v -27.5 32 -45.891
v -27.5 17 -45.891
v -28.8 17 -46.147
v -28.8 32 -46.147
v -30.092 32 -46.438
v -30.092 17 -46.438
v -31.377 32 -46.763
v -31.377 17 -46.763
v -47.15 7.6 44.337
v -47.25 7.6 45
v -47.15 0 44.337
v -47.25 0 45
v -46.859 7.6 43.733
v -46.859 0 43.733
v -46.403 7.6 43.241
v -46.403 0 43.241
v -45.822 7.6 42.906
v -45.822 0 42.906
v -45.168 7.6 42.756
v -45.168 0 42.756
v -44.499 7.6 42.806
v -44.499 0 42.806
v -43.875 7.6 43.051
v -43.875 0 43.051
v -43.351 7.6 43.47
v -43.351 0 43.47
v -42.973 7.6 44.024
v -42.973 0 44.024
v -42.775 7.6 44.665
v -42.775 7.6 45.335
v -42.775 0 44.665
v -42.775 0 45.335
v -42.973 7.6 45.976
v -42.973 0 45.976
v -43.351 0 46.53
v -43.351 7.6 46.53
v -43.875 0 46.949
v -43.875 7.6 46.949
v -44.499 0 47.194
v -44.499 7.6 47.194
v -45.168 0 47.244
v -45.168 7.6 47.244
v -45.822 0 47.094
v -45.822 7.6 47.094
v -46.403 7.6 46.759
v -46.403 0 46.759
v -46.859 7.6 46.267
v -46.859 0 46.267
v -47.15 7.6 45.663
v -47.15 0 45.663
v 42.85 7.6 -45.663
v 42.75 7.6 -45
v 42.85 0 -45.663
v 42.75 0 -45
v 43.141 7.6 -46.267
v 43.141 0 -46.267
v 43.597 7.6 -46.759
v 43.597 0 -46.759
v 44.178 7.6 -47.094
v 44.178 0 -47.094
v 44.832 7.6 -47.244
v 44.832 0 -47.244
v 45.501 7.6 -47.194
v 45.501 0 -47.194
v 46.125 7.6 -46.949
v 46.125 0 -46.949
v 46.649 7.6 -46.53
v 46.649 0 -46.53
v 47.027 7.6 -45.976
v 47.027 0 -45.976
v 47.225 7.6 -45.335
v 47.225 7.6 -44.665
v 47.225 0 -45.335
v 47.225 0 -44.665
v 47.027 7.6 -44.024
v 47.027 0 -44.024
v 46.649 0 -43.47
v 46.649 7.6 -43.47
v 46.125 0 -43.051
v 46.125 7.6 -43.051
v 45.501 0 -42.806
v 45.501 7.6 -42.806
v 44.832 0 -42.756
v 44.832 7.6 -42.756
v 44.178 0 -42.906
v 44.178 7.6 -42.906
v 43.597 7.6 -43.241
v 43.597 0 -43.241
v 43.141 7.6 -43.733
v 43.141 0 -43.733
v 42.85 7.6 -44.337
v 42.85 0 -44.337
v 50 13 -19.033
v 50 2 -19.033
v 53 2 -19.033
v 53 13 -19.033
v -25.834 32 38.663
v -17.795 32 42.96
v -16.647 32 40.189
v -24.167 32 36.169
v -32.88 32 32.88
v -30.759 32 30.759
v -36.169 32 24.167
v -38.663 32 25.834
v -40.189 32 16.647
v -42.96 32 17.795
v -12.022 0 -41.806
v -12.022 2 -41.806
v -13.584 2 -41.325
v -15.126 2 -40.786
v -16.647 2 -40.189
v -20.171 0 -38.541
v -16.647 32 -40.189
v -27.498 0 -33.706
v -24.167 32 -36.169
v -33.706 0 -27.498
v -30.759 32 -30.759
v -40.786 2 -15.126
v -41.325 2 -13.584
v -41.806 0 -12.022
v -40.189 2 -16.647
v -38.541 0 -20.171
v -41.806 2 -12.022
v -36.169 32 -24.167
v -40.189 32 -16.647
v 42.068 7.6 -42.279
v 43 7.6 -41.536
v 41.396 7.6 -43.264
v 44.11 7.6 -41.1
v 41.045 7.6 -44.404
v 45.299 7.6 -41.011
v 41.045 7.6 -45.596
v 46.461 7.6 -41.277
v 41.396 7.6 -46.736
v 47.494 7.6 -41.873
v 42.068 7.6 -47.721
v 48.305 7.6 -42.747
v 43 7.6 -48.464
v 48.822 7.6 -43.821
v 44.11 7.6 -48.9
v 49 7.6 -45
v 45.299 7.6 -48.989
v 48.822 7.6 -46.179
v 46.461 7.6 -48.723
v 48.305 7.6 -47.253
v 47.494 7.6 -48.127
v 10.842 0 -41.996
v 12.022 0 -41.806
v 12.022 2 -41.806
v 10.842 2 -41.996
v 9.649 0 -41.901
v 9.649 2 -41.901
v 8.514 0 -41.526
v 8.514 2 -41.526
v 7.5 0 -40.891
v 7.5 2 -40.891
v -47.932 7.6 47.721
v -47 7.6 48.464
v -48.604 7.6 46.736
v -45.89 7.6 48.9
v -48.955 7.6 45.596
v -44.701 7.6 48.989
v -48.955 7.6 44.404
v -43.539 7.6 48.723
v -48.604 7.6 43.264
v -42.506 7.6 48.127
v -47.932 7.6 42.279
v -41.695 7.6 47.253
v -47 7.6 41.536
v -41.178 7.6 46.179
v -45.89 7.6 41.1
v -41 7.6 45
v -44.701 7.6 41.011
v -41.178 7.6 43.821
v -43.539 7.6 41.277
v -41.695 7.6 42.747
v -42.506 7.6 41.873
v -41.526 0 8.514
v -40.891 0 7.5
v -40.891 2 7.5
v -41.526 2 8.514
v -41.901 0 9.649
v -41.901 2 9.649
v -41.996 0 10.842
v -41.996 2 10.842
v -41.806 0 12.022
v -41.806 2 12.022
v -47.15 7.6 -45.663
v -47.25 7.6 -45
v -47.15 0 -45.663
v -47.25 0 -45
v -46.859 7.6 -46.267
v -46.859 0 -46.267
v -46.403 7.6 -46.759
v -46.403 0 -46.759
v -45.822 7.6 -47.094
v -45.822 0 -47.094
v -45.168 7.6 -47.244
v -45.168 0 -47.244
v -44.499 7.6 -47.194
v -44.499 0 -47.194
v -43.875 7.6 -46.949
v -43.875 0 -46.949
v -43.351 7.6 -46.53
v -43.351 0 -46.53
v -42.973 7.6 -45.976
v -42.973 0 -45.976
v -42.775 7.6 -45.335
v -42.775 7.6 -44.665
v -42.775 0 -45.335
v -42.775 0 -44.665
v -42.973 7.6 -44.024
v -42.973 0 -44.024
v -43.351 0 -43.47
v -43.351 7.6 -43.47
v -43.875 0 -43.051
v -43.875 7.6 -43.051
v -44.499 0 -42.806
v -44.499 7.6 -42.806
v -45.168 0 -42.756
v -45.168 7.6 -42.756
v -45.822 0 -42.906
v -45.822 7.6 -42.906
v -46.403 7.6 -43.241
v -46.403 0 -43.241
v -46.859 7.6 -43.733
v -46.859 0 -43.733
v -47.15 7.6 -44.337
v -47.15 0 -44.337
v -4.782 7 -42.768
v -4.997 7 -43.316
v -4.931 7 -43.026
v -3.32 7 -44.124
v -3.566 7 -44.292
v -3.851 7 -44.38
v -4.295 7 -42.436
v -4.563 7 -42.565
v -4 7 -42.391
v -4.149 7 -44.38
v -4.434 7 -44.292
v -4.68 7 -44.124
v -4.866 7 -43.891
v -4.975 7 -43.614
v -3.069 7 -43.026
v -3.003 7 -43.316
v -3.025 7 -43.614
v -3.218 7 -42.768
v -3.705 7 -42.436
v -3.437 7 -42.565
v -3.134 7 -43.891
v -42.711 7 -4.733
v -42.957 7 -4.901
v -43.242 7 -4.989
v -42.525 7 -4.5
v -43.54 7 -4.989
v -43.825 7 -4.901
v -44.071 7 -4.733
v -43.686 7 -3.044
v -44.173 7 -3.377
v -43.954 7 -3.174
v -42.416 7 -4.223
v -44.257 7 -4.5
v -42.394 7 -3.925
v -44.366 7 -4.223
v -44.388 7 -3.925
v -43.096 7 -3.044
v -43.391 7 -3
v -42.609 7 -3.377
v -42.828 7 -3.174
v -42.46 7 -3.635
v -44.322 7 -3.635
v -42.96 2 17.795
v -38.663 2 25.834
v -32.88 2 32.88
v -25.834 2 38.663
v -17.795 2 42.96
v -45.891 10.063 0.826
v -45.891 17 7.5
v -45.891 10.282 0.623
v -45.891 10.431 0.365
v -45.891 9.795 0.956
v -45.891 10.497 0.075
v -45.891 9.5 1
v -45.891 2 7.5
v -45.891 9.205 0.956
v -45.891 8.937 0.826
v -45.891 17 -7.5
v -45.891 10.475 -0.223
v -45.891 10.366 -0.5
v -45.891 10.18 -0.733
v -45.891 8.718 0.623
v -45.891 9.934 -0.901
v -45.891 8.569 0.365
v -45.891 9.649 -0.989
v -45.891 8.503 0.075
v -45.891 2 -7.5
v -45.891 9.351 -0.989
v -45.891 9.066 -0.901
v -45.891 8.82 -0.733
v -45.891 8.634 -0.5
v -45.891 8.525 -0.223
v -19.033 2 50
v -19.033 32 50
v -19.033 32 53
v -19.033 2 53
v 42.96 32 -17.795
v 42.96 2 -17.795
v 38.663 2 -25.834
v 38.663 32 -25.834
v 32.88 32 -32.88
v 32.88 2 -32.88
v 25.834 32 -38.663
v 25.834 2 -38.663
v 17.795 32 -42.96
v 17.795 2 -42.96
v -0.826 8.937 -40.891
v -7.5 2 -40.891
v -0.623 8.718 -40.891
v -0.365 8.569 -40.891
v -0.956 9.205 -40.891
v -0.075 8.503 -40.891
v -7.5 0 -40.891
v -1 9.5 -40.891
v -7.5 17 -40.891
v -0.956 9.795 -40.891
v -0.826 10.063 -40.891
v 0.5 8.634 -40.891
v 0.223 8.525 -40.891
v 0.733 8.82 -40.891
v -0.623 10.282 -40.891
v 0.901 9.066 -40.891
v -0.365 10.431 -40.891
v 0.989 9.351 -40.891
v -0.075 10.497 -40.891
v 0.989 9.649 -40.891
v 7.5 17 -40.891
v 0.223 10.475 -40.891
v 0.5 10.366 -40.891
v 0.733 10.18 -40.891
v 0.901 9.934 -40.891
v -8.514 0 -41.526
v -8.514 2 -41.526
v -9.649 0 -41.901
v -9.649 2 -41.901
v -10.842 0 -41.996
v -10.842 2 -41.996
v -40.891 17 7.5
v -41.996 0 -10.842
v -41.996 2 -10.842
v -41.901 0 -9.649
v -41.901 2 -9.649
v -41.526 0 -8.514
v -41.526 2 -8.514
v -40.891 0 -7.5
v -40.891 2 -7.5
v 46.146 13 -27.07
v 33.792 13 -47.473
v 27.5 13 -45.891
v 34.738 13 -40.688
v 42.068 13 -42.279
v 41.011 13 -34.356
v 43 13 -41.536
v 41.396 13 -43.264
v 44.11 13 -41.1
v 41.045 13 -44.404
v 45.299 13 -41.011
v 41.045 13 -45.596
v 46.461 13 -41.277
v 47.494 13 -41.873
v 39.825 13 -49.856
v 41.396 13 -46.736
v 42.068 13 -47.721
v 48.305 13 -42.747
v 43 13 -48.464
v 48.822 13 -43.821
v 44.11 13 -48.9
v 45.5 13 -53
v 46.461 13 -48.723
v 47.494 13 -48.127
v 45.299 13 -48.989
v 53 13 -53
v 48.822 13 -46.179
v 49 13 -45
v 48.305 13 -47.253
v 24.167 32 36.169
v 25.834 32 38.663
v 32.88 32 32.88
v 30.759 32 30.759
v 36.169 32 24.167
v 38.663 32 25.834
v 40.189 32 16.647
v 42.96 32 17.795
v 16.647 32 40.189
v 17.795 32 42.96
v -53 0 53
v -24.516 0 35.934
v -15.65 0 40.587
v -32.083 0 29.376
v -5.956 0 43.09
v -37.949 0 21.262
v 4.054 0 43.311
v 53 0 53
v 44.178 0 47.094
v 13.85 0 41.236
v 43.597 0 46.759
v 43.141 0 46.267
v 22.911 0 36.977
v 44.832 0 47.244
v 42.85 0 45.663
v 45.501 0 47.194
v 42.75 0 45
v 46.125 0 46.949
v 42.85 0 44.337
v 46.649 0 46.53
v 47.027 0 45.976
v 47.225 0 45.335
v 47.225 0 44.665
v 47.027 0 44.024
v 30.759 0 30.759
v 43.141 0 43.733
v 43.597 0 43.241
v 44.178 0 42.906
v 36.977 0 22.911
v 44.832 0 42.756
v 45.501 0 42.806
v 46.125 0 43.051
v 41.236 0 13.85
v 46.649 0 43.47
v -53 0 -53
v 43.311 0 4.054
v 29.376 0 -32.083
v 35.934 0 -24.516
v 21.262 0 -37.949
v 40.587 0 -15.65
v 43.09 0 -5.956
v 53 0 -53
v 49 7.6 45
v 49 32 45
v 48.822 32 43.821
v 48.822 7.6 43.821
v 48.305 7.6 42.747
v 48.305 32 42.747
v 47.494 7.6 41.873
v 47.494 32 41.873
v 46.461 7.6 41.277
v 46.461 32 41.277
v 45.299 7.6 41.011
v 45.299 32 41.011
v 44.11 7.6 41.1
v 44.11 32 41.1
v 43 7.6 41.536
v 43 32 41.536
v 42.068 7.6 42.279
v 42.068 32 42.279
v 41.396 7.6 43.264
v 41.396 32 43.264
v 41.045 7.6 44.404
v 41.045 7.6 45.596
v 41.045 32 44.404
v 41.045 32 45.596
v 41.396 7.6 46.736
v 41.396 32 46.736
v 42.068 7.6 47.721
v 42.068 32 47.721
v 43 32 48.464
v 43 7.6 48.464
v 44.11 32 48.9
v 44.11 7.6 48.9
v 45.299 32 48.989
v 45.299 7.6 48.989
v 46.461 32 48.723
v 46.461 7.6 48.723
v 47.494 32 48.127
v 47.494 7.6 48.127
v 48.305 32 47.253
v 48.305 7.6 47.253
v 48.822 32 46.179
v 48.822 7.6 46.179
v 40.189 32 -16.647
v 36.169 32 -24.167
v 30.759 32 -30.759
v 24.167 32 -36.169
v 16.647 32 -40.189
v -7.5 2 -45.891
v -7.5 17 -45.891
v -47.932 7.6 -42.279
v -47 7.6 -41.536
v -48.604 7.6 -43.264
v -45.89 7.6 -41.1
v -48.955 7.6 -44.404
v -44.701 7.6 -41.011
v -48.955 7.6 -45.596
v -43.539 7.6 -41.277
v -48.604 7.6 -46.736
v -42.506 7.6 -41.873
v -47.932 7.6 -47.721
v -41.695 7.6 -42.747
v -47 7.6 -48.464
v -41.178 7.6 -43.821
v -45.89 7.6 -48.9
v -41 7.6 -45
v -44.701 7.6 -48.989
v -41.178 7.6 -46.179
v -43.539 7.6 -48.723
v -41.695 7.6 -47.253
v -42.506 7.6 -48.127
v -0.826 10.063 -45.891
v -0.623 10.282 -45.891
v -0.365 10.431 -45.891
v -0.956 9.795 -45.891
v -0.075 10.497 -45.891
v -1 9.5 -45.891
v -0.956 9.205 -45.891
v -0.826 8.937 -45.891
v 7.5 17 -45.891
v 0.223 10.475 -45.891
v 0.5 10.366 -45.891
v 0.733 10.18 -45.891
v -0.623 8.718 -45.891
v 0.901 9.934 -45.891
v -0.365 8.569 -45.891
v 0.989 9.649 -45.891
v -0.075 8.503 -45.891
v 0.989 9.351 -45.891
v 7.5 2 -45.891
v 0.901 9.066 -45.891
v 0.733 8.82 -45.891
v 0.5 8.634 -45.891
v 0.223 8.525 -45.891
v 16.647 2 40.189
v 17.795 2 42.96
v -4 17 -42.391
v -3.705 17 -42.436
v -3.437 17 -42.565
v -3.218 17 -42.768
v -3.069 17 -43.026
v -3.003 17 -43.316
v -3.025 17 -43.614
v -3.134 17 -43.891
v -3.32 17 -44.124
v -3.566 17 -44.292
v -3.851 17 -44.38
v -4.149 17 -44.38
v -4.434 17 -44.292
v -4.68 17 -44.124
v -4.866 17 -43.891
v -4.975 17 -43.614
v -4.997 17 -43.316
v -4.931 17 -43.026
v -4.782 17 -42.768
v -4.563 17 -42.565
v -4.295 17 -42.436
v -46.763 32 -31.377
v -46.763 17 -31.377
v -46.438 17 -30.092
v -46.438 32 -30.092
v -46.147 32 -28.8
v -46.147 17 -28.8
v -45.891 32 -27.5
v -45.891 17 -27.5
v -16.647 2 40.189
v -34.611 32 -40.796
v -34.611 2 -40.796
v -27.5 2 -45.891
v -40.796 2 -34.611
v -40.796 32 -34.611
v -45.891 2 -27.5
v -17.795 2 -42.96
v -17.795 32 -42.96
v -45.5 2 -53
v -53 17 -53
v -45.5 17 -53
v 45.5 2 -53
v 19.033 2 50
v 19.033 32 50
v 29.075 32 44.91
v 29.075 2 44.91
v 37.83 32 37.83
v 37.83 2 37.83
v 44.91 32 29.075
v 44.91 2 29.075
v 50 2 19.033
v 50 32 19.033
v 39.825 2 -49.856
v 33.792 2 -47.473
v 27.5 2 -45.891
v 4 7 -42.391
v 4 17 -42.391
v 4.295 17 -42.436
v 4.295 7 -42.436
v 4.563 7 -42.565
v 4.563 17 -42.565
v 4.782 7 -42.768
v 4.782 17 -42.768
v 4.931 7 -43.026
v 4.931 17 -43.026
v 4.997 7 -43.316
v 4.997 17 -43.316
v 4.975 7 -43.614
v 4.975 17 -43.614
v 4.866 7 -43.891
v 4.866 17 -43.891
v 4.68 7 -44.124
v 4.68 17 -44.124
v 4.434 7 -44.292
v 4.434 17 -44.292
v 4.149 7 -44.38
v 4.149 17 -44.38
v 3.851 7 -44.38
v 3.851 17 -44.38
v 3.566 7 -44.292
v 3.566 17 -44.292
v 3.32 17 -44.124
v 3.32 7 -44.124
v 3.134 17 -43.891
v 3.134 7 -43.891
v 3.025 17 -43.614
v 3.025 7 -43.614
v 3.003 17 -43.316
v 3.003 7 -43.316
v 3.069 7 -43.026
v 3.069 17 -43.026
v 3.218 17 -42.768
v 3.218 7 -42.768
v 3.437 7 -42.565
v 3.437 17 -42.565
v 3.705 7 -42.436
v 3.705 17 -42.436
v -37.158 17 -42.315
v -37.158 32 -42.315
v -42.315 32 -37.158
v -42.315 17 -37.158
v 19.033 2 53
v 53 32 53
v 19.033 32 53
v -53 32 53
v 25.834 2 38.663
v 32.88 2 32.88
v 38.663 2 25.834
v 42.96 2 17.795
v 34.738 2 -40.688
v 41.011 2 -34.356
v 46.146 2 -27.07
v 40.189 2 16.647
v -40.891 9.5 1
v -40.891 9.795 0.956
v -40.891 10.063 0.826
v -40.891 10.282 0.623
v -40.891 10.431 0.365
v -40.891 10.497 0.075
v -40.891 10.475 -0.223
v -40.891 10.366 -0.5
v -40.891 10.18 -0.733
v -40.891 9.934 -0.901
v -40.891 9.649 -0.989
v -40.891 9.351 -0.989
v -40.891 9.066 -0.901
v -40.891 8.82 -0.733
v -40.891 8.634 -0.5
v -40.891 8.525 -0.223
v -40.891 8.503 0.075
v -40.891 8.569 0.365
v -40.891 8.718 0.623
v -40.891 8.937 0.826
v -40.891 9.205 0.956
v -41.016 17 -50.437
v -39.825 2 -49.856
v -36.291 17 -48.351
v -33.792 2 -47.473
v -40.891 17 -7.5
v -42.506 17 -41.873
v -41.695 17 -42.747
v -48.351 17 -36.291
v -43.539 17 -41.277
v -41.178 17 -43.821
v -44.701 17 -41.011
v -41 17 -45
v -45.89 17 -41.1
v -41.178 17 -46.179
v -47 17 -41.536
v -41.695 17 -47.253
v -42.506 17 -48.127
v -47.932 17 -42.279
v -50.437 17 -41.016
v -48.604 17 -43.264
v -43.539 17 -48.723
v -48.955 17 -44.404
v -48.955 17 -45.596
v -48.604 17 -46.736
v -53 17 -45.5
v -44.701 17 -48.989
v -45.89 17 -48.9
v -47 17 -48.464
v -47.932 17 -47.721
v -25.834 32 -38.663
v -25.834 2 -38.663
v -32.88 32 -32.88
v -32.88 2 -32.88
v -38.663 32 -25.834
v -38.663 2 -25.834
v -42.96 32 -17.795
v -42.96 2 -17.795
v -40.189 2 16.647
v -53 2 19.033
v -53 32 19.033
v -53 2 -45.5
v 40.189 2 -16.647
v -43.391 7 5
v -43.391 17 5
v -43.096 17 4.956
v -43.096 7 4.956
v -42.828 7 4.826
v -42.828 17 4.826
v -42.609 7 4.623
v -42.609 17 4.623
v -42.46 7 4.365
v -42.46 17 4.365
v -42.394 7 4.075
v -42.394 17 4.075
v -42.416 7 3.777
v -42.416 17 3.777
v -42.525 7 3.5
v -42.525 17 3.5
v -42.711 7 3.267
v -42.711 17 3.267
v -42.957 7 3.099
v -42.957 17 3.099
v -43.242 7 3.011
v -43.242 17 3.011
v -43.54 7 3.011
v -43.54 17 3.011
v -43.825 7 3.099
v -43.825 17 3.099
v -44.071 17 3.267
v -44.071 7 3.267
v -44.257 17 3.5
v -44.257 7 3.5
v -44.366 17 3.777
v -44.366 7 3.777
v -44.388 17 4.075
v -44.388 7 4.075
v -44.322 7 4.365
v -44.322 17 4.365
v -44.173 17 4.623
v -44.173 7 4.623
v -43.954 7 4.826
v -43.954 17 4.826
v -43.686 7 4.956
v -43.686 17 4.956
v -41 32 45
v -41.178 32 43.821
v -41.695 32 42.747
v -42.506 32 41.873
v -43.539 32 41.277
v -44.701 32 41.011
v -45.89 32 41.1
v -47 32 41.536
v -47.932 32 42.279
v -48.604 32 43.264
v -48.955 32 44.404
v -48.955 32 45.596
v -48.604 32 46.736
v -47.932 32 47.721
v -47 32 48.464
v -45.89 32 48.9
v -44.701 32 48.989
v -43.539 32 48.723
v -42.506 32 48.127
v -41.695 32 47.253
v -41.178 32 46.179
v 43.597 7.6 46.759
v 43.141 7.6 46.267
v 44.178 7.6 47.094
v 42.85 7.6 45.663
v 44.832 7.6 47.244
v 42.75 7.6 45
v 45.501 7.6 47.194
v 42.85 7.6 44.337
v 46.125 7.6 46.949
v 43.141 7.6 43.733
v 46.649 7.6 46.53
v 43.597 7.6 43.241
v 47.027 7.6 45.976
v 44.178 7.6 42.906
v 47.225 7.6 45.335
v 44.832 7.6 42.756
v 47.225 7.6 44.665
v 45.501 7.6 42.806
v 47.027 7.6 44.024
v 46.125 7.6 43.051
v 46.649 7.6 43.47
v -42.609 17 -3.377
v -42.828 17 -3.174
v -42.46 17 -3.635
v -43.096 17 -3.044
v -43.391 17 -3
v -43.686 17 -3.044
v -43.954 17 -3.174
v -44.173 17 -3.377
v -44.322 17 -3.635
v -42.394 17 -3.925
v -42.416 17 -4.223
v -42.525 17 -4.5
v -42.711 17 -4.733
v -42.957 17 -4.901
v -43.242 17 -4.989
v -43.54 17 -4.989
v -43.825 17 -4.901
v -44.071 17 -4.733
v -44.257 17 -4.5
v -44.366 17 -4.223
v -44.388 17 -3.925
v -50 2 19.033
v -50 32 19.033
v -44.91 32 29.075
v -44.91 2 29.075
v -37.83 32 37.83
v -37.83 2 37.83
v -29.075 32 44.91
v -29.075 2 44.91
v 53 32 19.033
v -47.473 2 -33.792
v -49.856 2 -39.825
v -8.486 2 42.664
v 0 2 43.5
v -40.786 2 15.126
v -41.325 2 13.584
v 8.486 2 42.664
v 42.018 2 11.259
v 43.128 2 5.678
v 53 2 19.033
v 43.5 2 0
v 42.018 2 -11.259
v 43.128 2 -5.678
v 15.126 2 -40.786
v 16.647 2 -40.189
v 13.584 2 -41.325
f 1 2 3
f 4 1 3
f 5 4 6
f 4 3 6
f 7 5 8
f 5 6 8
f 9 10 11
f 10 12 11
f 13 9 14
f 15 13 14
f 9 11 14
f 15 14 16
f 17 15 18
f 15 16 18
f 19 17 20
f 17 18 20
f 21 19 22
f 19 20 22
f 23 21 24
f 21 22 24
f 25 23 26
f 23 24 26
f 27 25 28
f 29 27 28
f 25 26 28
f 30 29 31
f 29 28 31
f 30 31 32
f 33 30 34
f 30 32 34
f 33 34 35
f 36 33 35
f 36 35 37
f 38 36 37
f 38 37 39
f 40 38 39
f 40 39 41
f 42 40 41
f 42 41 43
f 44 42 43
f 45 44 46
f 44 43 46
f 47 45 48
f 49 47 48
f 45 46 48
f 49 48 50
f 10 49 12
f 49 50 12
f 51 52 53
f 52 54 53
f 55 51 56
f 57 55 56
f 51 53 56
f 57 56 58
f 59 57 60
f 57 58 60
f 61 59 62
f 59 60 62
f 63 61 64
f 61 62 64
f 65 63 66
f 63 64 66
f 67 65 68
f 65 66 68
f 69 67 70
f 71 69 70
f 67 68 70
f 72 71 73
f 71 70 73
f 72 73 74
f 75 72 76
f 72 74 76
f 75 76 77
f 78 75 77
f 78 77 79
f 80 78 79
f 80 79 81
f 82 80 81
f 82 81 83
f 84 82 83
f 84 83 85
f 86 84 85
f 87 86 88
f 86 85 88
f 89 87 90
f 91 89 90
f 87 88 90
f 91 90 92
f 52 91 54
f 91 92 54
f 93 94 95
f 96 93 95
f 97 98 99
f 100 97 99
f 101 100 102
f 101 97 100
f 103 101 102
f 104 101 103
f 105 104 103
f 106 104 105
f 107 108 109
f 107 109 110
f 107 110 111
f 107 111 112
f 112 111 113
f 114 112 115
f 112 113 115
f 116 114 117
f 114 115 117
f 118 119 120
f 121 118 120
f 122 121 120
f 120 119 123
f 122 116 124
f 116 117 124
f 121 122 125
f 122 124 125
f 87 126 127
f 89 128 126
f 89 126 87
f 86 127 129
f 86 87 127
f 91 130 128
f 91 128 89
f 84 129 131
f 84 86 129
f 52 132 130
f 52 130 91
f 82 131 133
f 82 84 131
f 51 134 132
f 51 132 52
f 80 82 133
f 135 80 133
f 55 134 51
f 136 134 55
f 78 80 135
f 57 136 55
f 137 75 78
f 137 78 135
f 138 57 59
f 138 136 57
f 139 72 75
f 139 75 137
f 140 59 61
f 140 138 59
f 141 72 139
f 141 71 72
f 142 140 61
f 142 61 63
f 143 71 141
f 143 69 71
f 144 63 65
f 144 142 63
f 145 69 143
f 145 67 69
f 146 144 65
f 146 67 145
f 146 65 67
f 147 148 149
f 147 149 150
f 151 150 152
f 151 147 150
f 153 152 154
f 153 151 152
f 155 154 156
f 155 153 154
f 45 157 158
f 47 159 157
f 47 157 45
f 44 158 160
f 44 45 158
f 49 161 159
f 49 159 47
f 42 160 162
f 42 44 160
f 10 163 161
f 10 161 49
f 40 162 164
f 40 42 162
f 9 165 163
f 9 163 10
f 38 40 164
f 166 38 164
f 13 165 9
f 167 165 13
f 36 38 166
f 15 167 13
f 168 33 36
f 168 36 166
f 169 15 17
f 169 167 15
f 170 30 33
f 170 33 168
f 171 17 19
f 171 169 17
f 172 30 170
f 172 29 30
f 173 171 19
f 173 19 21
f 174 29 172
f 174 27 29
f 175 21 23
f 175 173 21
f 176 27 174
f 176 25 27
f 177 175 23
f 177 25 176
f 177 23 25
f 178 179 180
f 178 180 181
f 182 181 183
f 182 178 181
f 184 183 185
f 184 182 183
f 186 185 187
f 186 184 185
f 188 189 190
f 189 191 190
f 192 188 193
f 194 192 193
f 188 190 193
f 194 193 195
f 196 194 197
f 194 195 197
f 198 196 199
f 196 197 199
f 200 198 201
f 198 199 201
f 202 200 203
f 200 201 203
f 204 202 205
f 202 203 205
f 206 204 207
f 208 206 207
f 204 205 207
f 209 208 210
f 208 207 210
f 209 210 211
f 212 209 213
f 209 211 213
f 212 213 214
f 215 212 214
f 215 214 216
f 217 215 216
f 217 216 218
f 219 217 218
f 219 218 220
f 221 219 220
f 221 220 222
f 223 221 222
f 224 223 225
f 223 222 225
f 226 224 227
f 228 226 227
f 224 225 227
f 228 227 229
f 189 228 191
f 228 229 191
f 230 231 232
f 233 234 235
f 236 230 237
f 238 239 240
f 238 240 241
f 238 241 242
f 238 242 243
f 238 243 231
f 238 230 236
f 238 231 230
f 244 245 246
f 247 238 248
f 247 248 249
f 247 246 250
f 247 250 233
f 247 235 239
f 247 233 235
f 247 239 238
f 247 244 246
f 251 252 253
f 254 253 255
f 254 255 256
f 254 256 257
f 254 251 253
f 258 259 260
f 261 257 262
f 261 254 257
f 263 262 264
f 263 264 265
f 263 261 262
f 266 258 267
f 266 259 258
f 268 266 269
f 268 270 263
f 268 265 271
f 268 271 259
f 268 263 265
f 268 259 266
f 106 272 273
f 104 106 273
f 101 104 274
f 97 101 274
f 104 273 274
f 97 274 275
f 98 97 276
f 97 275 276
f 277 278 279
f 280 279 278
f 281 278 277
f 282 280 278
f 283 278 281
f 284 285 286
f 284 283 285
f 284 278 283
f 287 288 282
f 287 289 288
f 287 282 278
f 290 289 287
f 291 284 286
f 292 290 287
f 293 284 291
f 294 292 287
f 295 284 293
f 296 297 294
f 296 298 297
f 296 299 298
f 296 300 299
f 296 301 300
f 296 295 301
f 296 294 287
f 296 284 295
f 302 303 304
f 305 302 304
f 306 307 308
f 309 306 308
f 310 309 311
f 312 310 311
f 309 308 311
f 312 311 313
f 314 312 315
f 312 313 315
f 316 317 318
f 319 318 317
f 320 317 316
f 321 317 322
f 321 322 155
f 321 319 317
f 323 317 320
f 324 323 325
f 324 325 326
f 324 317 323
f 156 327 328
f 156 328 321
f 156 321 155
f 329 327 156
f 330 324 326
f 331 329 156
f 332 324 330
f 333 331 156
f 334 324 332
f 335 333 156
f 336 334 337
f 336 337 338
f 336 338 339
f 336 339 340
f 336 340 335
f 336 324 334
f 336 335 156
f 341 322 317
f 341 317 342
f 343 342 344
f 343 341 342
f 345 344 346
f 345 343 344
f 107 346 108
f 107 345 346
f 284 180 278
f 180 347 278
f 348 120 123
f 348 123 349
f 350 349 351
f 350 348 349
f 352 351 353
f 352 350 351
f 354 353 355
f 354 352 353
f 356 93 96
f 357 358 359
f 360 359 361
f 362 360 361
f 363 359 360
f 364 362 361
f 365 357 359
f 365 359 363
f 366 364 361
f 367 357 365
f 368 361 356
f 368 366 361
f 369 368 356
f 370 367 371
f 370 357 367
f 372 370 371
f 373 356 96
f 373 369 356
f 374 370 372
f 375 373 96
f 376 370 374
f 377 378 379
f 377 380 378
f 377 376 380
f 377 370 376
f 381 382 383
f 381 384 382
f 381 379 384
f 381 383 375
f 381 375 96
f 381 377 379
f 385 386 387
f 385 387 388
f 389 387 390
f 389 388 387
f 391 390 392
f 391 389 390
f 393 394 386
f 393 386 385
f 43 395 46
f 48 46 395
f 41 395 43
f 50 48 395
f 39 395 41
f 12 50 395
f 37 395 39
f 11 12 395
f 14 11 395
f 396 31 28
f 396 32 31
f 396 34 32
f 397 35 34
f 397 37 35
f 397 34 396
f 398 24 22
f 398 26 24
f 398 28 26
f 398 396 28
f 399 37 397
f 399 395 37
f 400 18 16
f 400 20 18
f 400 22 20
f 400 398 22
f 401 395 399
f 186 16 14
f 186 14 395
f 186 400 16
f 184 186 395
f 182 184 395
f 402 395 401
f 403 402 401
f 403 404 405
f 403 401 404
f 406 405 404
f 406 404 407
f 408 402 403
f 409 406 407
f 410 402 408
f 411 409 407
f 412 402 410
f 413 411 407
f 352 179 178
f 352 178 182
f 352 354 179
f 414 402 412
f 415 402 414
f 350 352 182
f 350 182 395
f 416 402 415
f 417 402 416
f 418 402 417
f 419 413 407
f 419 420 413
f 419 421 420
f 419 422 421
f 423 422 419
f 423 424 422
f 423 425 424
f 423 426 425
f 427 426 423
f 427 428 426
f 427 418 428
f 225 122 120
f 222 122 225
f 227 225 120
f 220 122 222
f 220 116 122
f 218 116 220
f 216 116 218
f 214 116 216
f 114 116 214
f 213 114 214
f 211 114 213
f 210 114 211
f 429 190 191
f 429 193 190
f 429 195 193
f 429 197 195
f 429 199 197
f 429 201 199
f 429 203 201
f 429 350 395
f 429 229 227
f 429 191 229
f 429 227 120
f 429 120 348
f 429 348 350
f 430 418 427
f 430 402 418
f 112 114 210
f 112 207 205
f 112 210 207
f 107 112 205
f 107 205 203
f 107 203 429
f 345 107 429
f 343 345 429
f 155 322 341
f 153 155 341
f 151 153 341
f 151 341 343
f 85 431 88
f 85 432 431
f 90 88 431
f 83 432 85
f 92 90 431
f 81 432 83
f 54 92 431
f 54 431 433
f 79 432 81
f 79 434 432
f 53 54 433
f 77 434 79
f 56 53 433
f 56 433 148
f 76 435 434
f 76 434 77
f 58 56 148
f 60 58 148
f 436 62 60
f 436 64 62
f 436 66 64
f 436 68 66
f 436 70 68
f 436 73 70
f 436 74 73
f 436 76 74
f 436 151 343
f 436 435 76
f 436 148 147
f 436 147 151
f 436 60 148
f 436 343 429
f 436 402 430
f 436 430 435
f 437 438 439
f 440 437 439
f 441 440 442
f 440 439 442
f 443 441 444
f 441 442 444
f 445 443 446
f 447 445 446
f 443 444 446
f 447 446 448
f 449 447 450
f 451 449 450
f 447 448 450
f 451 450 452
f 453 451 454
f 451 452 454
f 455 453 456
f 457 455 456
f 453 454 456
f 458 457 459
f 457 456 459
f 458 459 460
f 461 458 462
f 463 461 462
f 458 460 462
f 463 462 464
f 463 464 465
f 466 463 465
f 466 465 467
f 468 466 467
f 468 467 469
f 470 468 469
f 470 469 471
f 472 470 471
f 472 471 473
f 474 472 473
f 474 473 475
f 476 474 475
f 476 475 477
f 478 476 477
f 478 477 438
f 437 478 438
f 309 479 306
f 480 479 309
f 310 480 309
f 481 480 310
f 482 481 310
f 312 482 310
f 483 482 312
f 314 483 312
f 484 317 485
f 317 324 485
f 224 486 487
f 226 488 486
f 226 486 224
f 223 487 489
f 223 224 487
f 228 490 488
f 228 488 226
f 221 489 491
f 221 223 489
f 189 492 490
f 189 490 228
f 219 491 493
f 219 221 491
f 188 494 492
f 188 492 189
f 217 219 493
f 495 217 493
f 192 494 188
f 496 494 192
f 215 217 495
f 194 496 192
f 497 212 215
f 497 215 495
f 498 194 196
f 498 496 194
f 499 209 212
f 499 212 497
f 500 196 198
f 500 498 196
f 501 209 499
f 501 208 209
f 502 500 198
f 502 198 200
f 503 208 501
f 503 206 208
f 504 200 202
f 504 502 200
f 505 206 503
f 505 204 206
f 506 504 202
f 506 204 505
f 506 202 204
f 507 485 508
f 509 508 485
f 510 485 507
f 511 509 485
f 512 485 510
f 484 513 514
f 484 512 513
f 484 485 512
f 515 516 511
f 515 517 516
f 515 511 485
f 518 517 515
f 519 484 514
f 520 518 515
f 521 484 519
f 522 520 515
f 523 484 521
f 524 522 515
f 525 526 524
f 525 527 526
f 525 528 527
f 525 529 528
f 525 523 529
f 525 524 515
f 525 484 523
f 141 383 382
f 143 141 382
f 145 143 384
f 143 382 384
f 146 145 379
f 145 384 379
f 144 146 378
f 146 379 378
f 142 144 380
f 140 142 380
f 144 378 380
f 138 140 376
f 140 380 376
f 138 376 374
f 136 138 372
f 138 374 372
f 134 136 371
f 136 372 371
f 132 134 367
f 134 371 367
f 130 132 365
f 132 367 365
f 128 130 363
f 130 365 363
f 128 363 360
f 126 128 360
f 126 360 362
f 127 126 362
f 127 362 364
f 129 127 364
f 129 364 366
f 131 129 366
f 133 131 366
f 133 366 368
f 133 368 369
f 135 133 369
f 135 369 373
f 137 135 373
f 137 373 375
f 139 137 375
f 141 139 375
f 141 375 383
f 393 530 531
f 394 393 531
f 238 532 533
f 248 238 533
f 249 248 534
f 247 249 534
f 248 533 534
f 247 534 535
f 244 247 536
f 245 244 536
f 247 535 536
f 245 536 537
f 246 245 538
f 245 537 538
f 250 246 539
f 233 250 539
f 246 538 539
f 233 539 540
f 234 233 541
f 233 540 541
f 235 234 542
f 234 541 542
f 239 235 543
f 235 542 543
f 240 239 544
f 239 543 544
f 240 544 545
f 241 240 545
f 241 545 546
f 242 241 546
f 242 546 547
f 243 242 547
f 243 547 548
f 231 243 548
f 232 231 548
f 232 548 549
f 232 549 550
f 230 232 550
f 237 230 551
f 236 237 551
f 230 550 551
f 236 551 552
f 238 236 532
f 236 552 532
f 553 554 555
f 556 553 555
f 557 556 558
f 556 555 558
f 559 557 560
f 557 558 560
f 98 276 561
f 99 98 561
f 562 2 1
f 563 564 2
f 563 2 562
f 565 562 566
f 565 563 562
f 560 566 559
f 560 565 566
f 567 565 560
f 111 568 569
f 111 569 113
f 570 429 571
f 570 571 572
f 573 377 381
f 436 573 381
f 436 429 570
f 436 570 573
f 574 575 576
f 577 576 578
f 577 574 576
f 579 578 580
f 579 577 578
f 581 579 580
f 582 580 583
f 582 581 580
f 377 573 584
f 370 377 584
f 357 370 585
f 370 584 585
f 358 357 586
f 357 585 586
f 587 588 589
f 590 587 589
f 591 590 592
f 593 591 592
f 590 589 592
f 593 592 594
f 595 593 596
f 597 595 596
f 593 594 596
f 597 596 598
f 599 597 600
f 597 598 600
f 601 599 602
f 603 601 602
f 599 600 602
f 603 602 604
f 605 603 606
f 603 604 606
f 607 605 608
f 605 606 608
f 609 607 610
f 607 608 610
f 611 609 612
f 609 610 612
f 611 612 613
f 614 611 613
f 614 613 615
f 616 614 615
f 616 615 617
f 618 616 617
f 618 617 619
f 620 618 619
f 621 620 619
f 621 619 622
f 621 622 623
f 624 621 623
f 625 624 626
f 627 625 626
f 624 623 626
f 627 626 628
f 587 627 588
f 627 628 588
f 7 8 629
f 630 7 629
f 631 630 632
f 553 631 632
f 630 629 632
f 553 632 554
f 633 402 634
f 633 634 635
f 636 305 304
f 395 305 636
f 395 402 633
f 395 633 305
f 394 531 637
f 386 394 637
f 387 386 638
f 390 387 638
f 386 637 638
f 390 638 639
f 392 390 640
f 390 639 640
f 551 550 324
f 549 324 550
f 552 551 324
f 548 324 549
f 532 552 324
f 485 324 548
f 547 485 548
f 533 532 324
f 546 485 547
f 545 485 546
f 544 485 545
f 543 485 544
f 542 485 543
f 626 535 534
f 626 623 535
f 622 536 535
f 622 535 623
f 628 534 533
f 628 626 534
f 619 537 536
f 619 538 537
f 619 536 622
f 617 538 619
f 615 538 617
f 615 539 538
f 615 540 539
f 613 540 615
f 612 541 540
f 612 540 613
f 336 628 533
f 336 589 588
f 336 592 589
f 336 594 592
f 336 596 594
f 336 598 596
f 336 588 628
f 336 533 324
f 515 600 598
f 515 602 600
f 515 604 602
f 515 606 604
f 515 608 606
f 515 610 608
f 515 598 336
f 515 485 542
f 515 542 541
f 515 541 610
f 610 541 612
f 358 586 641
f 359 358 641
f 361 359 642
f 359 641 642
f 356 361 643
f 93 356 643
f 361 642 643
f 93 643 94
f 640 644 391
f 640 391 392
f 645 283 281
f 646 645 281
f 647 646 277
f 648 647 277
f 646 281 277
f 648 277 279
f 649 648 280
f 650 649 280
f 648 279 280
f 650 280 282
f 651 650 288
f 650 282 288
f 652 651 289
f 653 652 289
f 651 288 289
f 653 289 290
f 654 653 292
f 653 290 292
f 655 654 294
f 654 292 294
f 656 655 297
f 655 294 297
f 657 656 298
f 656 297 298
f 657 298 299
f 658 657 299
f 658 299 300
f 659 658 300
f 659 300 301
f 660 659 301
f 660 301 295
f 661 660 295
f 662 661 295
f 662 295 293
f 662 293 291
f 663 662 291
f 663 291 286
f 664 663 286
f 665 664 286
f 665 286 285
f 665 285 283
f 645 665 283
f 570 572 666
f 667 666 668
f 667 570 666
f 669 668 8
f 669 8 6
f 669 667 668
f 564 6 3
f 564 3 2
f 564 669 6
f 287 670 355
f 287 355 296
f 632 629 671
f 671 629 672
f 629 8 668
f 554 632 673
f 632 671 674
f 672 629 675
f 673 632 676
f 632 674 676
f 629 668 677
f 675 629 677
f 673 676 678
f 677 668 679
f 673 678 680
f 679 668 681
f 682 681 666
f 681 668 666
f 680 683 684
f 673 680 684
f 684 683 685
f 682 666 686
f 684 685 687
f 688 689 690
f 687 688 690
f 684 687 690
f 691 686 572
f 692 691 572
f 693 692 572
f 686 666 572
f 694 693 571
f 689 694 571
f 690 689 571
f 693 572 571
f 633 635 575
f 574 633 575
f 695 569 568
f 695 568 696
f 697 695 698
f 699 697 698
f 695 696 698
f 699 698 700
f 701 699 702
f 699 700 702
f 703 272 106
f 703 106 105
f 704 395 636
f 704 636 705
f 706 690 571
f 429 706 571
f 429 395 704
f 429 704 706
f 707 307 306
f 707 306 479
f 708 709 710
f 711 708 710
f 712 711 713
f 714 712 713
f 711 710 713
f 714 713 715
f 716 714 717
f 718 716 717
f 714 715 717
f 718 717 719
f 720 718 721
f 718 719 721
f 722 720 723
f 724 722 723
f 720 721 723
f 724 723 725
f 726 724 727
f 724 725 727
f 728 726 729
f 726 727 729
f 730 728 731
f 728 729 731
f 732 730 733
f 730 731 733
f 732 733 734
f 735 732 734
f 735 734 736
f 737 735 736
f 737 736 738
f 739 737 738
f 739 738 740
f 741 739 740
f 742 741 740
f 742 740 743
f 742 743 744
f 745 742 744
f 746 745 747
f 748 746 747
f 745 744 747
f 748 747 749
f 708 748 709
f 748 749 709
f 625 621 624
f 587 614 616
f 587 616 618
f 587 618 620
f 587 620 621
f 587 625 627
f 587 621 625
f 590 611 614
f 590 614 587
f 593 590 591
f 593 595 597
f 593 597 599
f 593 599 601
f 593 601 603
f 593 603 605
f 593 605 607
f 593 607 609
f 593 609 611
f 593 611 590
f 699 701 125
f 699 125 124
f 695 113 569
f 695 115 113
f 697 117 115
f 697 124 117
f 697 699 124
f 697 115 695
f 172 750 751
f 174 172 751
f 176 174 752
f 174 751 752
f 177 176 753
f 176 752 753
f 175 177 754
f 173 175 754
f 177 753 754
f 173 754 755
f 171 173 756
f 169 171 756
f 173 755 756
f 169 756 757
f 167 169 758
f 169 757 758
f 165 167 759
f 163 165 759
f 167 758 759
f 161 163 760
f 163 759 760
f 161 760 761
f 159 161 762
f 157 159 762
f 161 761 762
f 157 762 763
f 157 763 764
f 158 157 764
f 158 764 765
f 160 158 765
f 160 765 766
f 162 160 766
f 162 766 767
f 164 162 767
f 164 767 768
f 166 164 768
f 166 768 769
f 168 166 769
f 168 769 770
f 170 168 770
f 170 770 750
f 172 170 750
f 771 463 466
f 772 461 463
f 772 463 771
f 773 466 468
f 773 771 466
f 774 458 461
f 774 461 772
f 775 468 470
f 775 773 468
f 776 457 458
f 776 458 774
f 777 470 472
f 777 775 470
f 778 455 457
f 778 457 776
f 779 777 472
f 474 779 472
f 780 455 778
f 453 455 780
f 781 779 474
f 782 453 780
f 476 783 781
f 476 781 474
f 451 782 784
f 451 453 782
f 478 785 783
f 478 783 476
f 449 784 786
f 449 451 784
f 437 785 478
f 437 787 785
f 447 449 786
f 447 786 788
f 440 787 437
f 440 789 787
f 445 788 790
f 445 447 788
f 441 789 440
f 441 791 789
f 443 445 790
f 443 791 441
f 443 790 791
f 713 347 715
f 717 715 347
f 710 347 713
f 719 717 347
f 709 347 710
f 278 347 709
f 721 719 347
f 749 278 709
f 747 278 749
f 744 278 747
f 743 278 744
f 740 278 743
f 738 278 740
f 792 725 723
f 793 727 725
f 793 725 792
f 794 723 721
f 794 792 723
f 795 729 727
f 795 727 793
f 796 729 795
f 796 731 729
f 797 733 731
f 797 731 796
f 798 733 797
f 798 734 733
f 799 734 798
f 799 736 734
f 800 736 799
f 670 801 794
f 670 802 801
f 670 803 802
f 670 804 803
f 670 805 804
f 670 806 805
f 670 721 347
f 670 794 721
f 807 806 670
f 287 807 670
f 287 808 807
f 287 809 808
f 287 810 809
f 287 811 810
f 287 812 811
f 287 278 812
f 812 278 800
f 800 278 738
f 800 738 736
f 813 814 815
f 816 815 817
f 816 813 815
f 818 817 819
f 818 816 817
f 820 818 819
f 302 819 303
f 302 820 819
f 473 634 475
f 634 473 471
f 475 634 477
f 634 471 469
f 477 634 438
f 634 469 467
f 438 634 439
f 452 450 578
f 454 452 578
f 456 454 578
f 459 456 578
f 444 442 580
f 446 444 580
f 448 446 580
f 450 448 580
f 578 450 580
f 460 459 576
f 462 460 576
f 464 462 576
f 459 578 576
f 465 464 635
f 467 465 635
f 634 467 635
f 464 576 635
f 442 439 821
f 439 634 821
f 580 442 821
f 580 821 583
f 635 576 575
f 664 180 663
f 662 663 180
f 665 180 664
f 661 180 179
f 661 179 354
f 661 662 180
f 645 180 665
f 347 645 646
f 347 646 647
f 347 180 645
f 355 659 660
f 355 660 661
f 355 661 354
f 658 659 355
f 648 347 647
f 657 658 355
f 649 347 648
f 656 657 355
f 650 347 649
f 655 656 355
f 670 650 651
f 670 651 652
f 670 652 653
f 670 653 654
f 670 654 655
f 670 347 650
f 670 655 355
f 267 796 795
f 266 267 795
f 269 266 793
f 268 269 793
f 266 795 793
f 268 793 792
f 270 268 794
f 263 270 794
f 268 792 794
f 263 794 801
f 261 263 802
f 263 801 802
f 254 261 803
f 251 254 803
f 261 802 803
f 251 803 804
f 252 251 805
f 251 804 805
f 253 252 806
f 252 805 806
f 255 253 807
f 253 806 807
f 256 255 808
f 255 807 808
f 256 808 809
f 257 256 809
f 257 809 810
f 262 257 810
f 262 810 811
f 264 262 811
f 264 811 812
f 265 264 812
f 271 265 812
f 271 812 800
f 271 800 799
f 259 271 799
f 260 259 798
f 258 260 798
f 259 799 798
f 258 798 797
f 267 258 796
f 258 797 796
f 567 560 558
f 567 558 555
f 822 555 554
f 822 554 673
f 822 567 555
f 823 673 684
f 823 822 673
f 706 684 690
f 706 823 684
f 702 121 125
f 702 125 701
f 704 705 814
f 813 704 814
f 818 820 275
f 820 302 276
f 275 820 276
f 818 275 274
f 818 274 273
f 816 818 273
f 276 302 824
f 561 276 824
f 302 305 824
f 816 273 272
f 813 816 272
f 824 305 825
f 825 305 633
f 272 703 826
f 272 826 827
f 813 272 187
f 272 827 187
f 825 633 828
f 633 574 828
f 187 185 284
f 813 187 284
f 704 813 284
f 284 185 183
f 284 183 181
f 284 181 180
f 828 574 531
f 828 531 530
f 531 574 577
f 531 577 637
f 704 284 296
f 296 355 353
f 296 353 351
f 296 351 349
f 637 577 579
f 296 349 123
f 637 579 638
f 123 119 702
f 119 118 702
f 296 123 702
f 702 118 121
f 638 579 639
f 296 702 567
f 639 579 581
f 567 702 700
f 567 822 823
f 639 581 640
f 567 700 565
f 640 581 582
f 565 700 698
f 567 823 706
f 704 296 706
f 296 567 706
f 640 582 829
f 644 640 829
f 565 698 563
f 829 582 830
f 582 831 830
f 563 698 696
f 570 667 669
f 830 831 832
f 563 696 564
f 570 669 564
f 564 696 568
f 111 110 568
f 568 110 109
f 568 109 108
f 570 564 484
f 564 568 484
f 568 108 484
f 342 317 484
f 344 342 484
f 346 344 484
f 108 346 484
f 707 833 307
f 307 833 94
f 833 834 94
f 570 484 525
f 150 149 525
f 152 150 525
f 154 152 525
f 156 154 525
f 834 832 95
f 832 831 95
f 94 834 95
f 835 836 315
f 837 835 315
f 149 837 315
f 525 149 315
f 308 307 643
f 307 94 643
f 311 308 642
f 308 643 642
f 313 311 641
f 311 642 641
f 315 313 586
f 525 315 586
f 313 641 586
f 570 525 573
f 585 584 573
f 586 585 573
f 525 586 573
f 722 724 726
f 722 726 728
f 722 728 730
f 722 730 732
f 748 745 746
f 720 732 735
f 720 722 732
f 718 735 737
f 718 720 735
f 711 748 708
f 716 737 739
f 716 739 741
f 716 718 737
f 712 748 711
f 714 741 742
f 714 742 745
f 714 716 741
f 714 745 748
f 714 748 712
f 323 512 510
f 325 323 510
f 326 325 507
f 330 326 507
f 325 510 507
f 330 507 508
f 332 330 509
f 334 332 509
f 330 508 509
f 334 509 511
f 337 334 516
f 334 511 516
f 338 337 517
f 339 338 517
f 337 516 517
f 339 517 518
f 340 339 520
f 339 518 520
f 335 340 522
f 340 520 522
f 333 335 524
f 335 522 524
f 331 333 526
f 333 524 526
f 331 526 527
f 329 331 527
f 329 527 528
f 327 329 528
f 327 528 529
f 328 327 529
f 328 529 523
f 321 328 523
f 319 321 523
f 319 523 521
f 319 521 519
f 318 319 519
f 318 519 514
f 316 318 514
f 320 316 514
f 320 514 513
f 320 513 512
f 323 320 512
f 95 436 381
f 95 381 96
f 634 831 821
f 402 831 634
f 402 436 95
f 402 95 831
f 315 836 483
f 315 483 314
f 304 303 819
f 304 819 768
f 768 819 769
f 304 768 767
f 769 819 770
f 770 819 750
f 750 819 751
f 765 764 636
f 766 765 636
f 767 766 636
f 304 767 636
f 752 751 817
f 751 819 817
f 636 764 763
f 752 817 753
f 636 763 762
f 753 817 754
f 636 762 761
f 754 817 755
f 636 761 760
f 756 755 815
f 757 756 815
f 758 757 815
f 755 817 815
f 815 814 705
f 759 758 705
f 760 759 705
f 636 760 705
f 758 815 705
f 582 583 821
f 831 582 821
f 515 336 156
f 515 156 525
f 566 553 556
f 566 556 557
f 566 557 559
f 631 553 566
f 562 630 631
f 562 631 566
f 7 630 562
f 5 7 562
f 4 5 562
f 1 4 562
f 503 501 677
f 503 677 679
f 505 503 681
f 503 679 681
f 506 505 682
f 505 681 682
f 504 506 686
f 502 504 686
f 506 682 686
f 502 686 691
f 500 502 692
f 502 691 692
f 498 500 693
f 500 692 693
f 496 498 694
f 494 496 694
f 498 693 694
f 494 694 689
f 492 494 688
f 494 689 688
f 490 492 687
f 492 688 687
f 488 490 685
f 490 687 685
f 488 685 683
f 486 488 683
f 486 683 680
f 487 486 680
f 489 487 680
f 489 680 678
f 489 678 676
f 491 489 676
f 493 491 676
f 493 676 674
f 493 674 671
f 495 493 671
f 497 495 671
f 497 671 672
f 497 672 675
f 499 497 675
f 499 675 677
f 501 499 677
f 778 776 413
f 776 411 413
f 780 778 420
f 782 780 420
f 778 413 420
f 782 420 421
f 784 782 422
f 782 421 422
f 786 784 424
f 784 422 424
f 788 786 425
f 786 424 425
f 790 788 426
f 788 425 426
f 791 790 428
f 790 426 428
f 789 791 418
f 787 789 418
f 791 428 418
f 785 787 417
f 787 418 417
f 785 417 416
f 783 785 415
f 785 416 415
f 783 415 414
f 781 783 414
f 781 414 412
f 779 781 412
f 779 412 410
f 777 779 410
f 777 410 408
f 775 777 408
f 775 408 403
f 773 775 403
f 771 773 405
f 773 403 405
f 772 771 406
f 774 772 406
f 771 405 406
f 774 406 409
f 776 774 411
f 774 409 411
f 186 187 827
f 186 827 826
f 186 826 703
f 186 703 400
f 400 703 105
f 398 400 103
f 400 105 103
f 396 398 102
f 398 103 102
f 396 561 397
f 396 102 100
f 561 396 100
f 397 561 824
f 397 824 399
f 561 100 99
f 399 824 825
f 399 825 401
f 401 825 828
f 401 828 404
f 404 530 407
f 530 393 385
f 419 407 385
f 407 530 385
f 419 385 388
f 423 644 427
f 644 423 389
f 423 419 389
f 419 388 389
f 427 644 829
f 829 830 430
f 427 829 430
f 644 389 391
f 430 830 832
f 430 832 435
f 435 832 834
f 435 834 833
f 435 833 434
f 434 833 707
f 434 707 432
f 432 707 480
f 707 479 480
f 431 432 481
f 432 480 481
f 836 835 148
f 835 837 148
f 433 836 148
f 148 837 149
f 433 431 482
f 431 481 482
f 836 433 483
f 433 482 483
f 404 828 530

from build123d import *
from build123d.topology import SkipClean

# Parameters (mm, degrees)
SKETCH1_W                                           = 106
SKETCH1_H                                           = 106
BOSS_EXTRUDE1_DEPTH                                 = 2
SKETCH2_R                                           = 46.5
SKETCH2_R_2                                         = 43.5
BOSS_EXTRUDE2_DEPTH                                 = 30
CUT_EXTRUDE1_REACH                                  = 82.734
SKETCH3_R                                           = 43.5
CUT_EXTRUDE2_START                                  = -30
CUT_EXTRUDE2_DEPTH                                  = 30
SKETCH5_W                                           = 15
SKETCH5_H                                           = 5
BOSS_EXTRUDE3_DEPTH                                 = 15
BOSS_EXTRUDE3_DIRECTION_2_REACH                     = 82.734
FILLET1_R                                           = 5
CIRPATTERN1_COUNT                                   = 2
CIRPATTERN1_ANGLE                                   = 90
FILLET1_OF_CIRPATTERN1_R                            = 5
BOSS_EXTRUDE4_DEPTH                                 = 30
BOSS_EXTRUDE5_DEPTH                                 = 15
BOSS_EXTRUDE6_DEPTH                                 = 15
CBORE_FOR_M4_HEX_SOCKET_HEAD_CAP_SCREW1_D           = 4.5
CBORE_FOR_M4_HEX_SOCKET_HEAD_CAP_SCREW1_CBORE_D     = 8
CBORE_FOR_M4_HEX_SOCKET_HEAD_CAP_SCREW1_CBORE_DEPTH = 24.4
CUT_EXTRUDE4_DEPTH                                  = 19
CUT_EXTRUDE5_REACH                                  = 118.672
SKETCH15_R                                          = 1
CUT_EXTRUDE6_REACH                                  = 118.672
SKETCH16_R                                          = 1
SKETCH17_R                                          = 1
CUT_EXTRUDE7_DEPTH                                  = 10


with BuildPart() as part:
    # Sketch1 → Boss-Extrude1 (new body)
    with BuildSketch(Plane(origin=(0, 0, 0), x_dir=(1, 0, 0), z_dir=(0, 1, 0))):
        Rectangle(SKETCH1_W, SKETCH1_H)
    extrude(amount=BOSS_EXTRUDE1_DEPTH)

    # Sketch2 → Boss-Extrude2 (add)
    with BuildSketch(Plane(origin=(0, 2, 0), x_dir=(1, 0, 0), z_dir=(0, 1, 0))):
        with Locations(Location((0, 0, 0), (0, 0, 90))):
            Circle(SKETCH2_R)
        with Locations(Location((0, 0, 0), (0, 0, 270))):
            Circle(SKETCH2_R_2, mode=Mode.SUBTRACT)
    extrude(amount=BOSS_EXTRUDE2_DEPTH)

    # Sketch3 → Cut-Extrude1 (cut, up to next)
    with BuildSketch(Plane(origin=(0, 2, 0), x_dir=(1, 0, 0), z_dir=(0, 1, 0)), mode=Mode.PRIVATE) as cut_extrude1_sk1:
        with Locations(Location((0, 0, 0), (0, 0, 90))):
            Circle(SKETCH3_R)
    cut_extrude1_tool1 = extrude(cut_extrude1_sk1.sketch, amount=-CUT_EXTRUDE1_REACH, mode=Mode.PRIVATE) & part.part
    add(cut_extrude1_tool1.solids().sort_by_distance((0, 2, 0))[0], mode=Mode.SUBTRACT)

    # Sketch4 → Cut-Extrude2 (cut)
    with BuildSketch(Plane(origin=(0, 32, 0), x_dir=(1, 0, 0), z_dir=(0, 1, 0)).offset(CUT_EXTRUDE2_START)):
        with BuildLine():
            ThreePointArc((-40.188759664, -16.646729308), (-43.5, 0), (-40.188759664, 16.646729308))
            Line((-40.188759664, 16.646729308), (-42.960398262, 17.794779605))
            ThreePointArc((-42.960398262, 17.794779605), (-46.5, 0), (-42.960398262, -17.794779605))
            Line((-42.960398262, -17.794779605), (-40.188759664, -16.646729308))
        make_face()
        with BuildLine():
            Line((-17.794779605, 42.960398262), (-16.646729308, 40.188759664))
            ThreePointArc((-16.646729308, 40.188759664), (0, 43.5), (16.646729308, 40.188759664))
            Line((16.646729308, 40.188759664), (17.794779605, 42.960398262))
            ThreePointArc((17.794779605, 42.960398262), (0, 46.5), (-17.794779605, 42.960398262))
        make_face()
        with BuildLine():
            Line((42.960398262, 17.794779605), (40.188759664, 16.646729308))
            ThreePointArc((40.188759664, 16.646729308), (42.664159698, 8.486429008), (43.5, 0))
            ThreePointArc((43.5, 0), (42.664159698, -8.486429008), (40.188759664, -16.646729308))
            Line((40.188759664, -16.646729308), (42.960398262, -17.794779605))
            ThreePointArc((42.960398262, -17.794779605), (45.606515539, -9.071699974), (46.5, 0))
            ThreePointArc((46.5, 0), (45.606515539, 9.071699974), (42.960398262, 17.794779605))
        make_face()
        with BuildLine():
            ThreePointArc((-16.646729308, -40.188759664), (0, -43.5), (16.646729308, -40.188759664))
            Line((16.646729308, -40.188759664), (17.794779605, -42.960398262))
            ThreePointArc((17.794779605, -42.960398262), (0, -46.5), (-17.794779605, -42.960398262))
            Line((-17.794779605, -42.960398262), (-16.646729308, -40.188759664))
        make_face()
    extrude(amount=CUT_EXTRUDE2_DEPTH, mode=Mode.SUBTRACT)

    # Sketch5 → Boss-Extrude3 (add)
    with SkipClean():  # the faces are left unmerged after this step: merging them gives an invalid solid
        with BuildSketch(Plane(origin=(0, 2, 0), x_dir=(1, 0, 0), z_dir=(0, 1, 0))):
            with Locations((0, 43.391175622)):
                Rectangle(SKETCH5_W, SKETCH5_H)
        boss_extrude3 = extrude(amount=BOSS_EXTRUDE3_DEPTH)

    # Boss-Extrude3 direction 2: up to this face of the body (flat: up to its plane)
    boss_extrude3_direction_2_end = Plane(part.part.faces().sort_by_distance((0, 0, 51.500933624))[0])
    # Sketch5 → Boss-Extrude3 direction 2 (add, up to the picked face)
    with BuildSketch(Plane(origin=(0, 2, 0), x_dir=(1, 0, 0), z_dir=(0, 1, 0)), mode=Mode.PRIVATE) as boss_extrude3_direction_2_sk1:
        with Locations((0, 43.391175622)):
            Rectangle(SKETCH5_W, SKETCH5_H)
    boss_extrude3_direction_2_tool1 = split(extrude(boss_extrude3_direction_2_sk1.sketch, amount=-BOSS_EXTRUDE3_DIRECTION_2_REACH, mode=Mode.PRIVATE), bisect_by=boss_extrude3_direction_2_end, keep=Keep.BOTH, mode=Mode.PRIVATE)
    boss_extrude3_direction_2 = boss_extrude3_direction_2_tool1.solids().sort_by(Axis((0, 2, -43.391176), (0, -1, 0)))[0]
    add(boss_extrude3_direction_2)

    # Fillet1
    # the kernel refuses this fillet: 5 mm, written as the material it adds along each edge
    with BuildSketch(Plane(origin=(7.5, 0, -42.848570571), x_dir=(0.9744247966149427, 0, 0.2247138530263045), z_dir=(0, 1, 0))) as fillet1_piece_1:
        with BuildLine():
            CenterArc((4.374240829, -4.992880869), FILLET1_R, 86.942139574, 54.952511428)
            Line((0.439853761, -1.907334175), (0.36116602, -1.845623241))
            ThreePointArc((0.36116602, -1.845623241), (0.122484401, -0.976138473), (-0.09744248, -0.022471385))
            Line((-0.09744248, -0.022471385), (-0.00533444, 0.099857617))
            ThreePointArc((-0.00533444, 0.099857617), (2.320481415, 0.161936438), (4.64629727, 0.099857617))
            Line((4.64629727, 0.099857617), (4.64096283, 0))
        make_face()
    extrude(amount=2)
    with BuildSketch(Plane(origin=(-7.5, 0, -42.848570571), x_dir=(-0.9744247966149427, 0, 0.2247138530263046), z_dir=(0, 1, 0))) as fillet1_piece_2:
        with BuildLine():
            CenterArc((4.374240829, 4.992880869), FILLET1_R, 218.105348998, 54.952511428)
            Line((0.439853761, 1.907334175), (0.36116602, 1.845623241))
            ThreePointArc((0.36116602, 1.845623241), (0.122484401, 0.976138473), (-0.09744248, 0.022471385))
            Line((-0.09744248, 0.022471385), (-0.00533444, -0.099857617))
            ThreePointArc((-0.00533444, -0.099857617), (2.320481415, -0.161936438), (4.64629727, -0.099857617))
            Line((4.64629727, -0.099857617), (4.64096283, 0))
        make_face()
    extrude(amount=2)

    # CirPattern1: Boss-Extrude3, Boss-Extrude3 direction 2 ×2 about axis
    cirpattern1_axis = Axis((0, 0, 0), (0, 1, 0))
    add([boss_extrude3.rotate(cirpattern1_axis, i * CIRPATTERN1_ANGLE / (CIRPATTERN1_COUNT - 1)) for i in range(1, CIRPATTERN1_COUNT)])
    add([boss_extrude3_direction_2.rotate(cirpattern1_axis, i * CIRPATTERN1_ANGLE / (CIRPATTERN1_COUNT - 1)) for i in range(1, CIRPATTERN1_COUNT)])

    # Fillet1 of CirPattern1
    # the kernel refuses this fillet: 5 mm, written as the material it adds along each edge
    with BuildSketch(Plane(origin=(-42.848570571, 0, -7.5), x_dir=(1, 0, 0), z_dir=(0, 1, 0))) as fillet1_of_cirpattern1_piece_1:
        with BuildLine():
            CenterArc((5.848139436, 3.140399232), FILLET1_OF_CIRPATTERN1_R, 163.956087306, 54.952511428)
            Line((1.042888639, 4.522269262), (0.946783623, 4.549906663))
            ThreePointArc((0.946783623, 4.549906663), (0.363649439, 2.297523992), (-0.098502461, 0.017241379))
            Line((-0.098502461, 0.017241379), (0, -0.1))
            ThreePointArc((0, -0.1), (0.978697474, -0.1), (1.879580059, -0.062807985))
            Line((1.879580059, -0.062807985), (1.957394949, 0))
        make_face()
    extrude(amount=2)
    with BuildSketch(Plane(origin=(-42.848570571, 0, 7.5), x_dir=(0.22471385302630772, 0, 0.974424796614942), z_dir=(0, 1, 0))) as fillet1_of_cirpattern1_piece_2:
        with BuildLine():
            CenterArc((4.374240829, 4.992880869), FILLET1_OF_CIRPATTERN1_R, 218.105348998, 54.952511428)
            Line((0.439853761, 1.907334175), (0.36116602, 1.845623241))
            ThreePointArc((0.36116602, 1.845623241), (0.122484401, 0.976138473), (-0.09744248, 0.022471385))
            Line((-0.09744248, 0.022471385), (-0.00533444, -0.099857617))
            ThreePointArc((-0.00533444, -0.099857617), (2.320481415, -0.161936438), (4.64629727, -0.099857617))
            Line((4.64629727, -0.099857617), (4.64096283, 0))
        make_face()
    extrude(amount=2)

    # Sketch6 → Boss-Extrude4 (add)
    with BuildSketch(Plane(origin=(0, 2, 0), x_dir=(1, 0, 0), z_dir=(0, 1, 0))):
        with BuildLine():
            Line((50, -19.032866311), (53, -19.032866311))
            Line((53, -19.032866311), (53, -53))
            Line((53, -53), (19.032866311, -53))
            Line((19.032866311, -53), (19.032866311, -50))
            ThreePointArc((19.032866311, -50), (37.830212793, -37.830212793), (50, -19.032866311))
        make_face()
        with BuildLine():
            Line((-19.032866311, -50), (-19.032866311, -53))
            Line((-19.032866311, -53), (-53, -53))
            Line((-53, -53), (-53, -19.032866311))
            Line((-53, -19.032866311), (-50, -19.032866311))
            ThreePointArc((-50, -19.032866311), (-37.830212793, -37.830212793), (-19.032866311, -50))
        make_face()
    extrude(amount=BOSS_EXTRUDE4_DEPTH)

    # Sketch8 → Boss-Extrude5 (add)
    with BuildSketch(Plane(origin=(0, 2, 0), x_dir=(1, 0, 0), z_dir=(0, 1, 0))):
        with BuildLine():
            Line((-53, 53), (-45.5, 53))
            ThreePointArc((-45.5, 53), (-36.847223427, 48.566395788), (-27.5, 45.891175622))
            ThreePointArc((-27.5, 45.891175622), (-37.830212793, 37.830212793), (-45.891175622, 27.5))
            ThreePointArc((-45.891175622, 27.5), (-48.566395788, 36.847223427), (-53, 45.5))
            Line((-53, 45.5), (-53, 53))
        make_face()
        with BuildLine():
            Line((50, 19.032866311), (53, 19.032866311))
            Line((53, 19.032866311), (53, 53))
            Line((53, 53), (45.5, 53))
            ThreePointArc((45.5, 53), (36.847223427, 48.566395788), (27.5, 45.891175622))
            ThreePointArc((27.5, 45.891175622), (41.011031379, 34.356153819), (50, 19.032866311))
        make_face()
    extrude(amount=BOSS_EXTRUDE5_DEPTH)

    # Sketch9 → Boss-Extrude6 (add)
    with BuildSketch(Plane(origin=(0, 17, 0), x_dir=(1, 0, 0), z_dir=(0, 1, 0))):
        with BuildLine():
            Line((50, 19.032866311), (53, 19.032866311))
            ThreePointArc((53, 19.032866311), (44.40829155, 34.628797866), (31.376796705, 46.762662761))
            ThreePointArc((31.376796705, 46.762662761), (29.447059001, 46.288392434), (27.5, 45.891175622))
            ThreePointArc((27.5, 45.891175622), (41.011031379, 34.356153819), (50, 19.032866311))
        make_face()
        with BuildLine():
            ThreePointArc((-45.891175622, 27.5), (-37.830212793, 37.830212793), (-27.5, 45.891175622))
            ThreePointArc((-27.5, 45.891175622), (-29.447059001, 46.288392434), (-31.376796705, 46.762662761))
            ThreePointArc((-31.376796705, 46.762662761), (-39.819907082, 39.819907082), (-46.762662761, 31.376796705))
            ThreePointArc((-46.762662761, 31.376796705), (-46.288392434, 29.447059001), (-45.891175622, 27.5))
        make_face()
    extrude(amount=BOSS_EXTRUDE6_DEPTH)

    # CBORE for M4 Hex Socket Head Cap Screw1 (through all)
    with Locations(Plane(origin=(0, 32, 0), x_dir=(1, 0, 0), z_dir=(0, 1, 0))):
        with Locations((-45, -45), (45, -45), (45, 45), (-45, 45)):
            CounterBoreHole(CBORE_FOR_M4_HEX_SOCKET_HEAD_CAP_SCREW1_D / 2, CBORE_FOR_M4_HEX_SOCKET_HEAD_CAP_SCREW1_CBORE_D / 2, CBORE_FOR_M4_HEX_SOCKET_HEAD_CAP_SCREW1_CBORE_DEPTH)

    # Sketch14 → Cut-Extrude4 (cut)
    with BuildSketch(Plane(origin=(0, 32, 0), x_dir=(1, 0, 0), z_dir=(0, 1, 0))):
        Polygon((50, 19.032866311), (53, 19.032866311), (53, 53), (45.5, 53), (27.5, 45.891175622), align=None)
    extrude(amount=-CUT_EXTRUDE4_DEPTH, mode=Mode.SUBTRACT)

    # Sketch15 → Cut-Extrude5 (cut, up to next)
    with BuildSketch(Plane(origin=(0, 0, -45.891175622), x_dir=(-1, 0, 0), z_dir=(0, 0, -1)), mode=Mode.PRIVATE) as cut_extrude5_sk1:
        with Locations((0, 9.5)):
            Circle(SKETCH15_R)
    cut_extrude5_tool1 = extrude(cut_extrude5_sk1.sketch, amount=-CUT_EXTRUDE5_REACH, mode=Mode.PRIVATE) & part.part
    add(cut_extrude5_tool1.solids().sort_by_distance((0, 9.5, -45.891176))[0], mode=Mode.SUBTRACT)

    # Sketch16 → Cut-Extrude6 (cut, up to next)
    with BuildSketch(Plane.ZY.offset(45.891175622), mode=Mode.PRIVATE) as cut_extrude6_sk1:
        with Locations((0, 9.5)):
            Circle(SKETCH16_R)
    cut_extrude6_tool1 = extrude(cut_extrude6_sk1.sketch, amount=-CUT_EXTRUDE6_REACH, mode=Mode.PRIVATE) & part.part
    add(cut_extrude6_tool1.solids().sort_by_distance((-45.891176, 9.5, 0))[0], mode=Mode.SUBTRACT)

    # Sketch17 → Cut-Extrude7 (cut)
    with BuildSketch(Plane(origin=(0, 17, 0), x_dir=(1, 0, 0), z_dir=(0, 1, 0))):
        with Locations(Location((4, 43.391175622, 0), (0, 0, 270))):
            Circle(SKETCH17_R)
        with Locations(Location((-4, 43.391175622, 0), (0, 0, 270))):
            Circle(SKETCH17_R)
        with Locations(Location((-43.391175622, 4, 0), (0, 0, 270))):
            Circle(SKETCH17_R)
        with Locations(Location((-43.391175622, -4, 0), (0, 0, 270))):
            Circle(SKETCH17_R)
    extrude(amount=-CUT_EXTRUDE7_DEPTH, mode=Mode.SUBTRACT)


solid = part.part
